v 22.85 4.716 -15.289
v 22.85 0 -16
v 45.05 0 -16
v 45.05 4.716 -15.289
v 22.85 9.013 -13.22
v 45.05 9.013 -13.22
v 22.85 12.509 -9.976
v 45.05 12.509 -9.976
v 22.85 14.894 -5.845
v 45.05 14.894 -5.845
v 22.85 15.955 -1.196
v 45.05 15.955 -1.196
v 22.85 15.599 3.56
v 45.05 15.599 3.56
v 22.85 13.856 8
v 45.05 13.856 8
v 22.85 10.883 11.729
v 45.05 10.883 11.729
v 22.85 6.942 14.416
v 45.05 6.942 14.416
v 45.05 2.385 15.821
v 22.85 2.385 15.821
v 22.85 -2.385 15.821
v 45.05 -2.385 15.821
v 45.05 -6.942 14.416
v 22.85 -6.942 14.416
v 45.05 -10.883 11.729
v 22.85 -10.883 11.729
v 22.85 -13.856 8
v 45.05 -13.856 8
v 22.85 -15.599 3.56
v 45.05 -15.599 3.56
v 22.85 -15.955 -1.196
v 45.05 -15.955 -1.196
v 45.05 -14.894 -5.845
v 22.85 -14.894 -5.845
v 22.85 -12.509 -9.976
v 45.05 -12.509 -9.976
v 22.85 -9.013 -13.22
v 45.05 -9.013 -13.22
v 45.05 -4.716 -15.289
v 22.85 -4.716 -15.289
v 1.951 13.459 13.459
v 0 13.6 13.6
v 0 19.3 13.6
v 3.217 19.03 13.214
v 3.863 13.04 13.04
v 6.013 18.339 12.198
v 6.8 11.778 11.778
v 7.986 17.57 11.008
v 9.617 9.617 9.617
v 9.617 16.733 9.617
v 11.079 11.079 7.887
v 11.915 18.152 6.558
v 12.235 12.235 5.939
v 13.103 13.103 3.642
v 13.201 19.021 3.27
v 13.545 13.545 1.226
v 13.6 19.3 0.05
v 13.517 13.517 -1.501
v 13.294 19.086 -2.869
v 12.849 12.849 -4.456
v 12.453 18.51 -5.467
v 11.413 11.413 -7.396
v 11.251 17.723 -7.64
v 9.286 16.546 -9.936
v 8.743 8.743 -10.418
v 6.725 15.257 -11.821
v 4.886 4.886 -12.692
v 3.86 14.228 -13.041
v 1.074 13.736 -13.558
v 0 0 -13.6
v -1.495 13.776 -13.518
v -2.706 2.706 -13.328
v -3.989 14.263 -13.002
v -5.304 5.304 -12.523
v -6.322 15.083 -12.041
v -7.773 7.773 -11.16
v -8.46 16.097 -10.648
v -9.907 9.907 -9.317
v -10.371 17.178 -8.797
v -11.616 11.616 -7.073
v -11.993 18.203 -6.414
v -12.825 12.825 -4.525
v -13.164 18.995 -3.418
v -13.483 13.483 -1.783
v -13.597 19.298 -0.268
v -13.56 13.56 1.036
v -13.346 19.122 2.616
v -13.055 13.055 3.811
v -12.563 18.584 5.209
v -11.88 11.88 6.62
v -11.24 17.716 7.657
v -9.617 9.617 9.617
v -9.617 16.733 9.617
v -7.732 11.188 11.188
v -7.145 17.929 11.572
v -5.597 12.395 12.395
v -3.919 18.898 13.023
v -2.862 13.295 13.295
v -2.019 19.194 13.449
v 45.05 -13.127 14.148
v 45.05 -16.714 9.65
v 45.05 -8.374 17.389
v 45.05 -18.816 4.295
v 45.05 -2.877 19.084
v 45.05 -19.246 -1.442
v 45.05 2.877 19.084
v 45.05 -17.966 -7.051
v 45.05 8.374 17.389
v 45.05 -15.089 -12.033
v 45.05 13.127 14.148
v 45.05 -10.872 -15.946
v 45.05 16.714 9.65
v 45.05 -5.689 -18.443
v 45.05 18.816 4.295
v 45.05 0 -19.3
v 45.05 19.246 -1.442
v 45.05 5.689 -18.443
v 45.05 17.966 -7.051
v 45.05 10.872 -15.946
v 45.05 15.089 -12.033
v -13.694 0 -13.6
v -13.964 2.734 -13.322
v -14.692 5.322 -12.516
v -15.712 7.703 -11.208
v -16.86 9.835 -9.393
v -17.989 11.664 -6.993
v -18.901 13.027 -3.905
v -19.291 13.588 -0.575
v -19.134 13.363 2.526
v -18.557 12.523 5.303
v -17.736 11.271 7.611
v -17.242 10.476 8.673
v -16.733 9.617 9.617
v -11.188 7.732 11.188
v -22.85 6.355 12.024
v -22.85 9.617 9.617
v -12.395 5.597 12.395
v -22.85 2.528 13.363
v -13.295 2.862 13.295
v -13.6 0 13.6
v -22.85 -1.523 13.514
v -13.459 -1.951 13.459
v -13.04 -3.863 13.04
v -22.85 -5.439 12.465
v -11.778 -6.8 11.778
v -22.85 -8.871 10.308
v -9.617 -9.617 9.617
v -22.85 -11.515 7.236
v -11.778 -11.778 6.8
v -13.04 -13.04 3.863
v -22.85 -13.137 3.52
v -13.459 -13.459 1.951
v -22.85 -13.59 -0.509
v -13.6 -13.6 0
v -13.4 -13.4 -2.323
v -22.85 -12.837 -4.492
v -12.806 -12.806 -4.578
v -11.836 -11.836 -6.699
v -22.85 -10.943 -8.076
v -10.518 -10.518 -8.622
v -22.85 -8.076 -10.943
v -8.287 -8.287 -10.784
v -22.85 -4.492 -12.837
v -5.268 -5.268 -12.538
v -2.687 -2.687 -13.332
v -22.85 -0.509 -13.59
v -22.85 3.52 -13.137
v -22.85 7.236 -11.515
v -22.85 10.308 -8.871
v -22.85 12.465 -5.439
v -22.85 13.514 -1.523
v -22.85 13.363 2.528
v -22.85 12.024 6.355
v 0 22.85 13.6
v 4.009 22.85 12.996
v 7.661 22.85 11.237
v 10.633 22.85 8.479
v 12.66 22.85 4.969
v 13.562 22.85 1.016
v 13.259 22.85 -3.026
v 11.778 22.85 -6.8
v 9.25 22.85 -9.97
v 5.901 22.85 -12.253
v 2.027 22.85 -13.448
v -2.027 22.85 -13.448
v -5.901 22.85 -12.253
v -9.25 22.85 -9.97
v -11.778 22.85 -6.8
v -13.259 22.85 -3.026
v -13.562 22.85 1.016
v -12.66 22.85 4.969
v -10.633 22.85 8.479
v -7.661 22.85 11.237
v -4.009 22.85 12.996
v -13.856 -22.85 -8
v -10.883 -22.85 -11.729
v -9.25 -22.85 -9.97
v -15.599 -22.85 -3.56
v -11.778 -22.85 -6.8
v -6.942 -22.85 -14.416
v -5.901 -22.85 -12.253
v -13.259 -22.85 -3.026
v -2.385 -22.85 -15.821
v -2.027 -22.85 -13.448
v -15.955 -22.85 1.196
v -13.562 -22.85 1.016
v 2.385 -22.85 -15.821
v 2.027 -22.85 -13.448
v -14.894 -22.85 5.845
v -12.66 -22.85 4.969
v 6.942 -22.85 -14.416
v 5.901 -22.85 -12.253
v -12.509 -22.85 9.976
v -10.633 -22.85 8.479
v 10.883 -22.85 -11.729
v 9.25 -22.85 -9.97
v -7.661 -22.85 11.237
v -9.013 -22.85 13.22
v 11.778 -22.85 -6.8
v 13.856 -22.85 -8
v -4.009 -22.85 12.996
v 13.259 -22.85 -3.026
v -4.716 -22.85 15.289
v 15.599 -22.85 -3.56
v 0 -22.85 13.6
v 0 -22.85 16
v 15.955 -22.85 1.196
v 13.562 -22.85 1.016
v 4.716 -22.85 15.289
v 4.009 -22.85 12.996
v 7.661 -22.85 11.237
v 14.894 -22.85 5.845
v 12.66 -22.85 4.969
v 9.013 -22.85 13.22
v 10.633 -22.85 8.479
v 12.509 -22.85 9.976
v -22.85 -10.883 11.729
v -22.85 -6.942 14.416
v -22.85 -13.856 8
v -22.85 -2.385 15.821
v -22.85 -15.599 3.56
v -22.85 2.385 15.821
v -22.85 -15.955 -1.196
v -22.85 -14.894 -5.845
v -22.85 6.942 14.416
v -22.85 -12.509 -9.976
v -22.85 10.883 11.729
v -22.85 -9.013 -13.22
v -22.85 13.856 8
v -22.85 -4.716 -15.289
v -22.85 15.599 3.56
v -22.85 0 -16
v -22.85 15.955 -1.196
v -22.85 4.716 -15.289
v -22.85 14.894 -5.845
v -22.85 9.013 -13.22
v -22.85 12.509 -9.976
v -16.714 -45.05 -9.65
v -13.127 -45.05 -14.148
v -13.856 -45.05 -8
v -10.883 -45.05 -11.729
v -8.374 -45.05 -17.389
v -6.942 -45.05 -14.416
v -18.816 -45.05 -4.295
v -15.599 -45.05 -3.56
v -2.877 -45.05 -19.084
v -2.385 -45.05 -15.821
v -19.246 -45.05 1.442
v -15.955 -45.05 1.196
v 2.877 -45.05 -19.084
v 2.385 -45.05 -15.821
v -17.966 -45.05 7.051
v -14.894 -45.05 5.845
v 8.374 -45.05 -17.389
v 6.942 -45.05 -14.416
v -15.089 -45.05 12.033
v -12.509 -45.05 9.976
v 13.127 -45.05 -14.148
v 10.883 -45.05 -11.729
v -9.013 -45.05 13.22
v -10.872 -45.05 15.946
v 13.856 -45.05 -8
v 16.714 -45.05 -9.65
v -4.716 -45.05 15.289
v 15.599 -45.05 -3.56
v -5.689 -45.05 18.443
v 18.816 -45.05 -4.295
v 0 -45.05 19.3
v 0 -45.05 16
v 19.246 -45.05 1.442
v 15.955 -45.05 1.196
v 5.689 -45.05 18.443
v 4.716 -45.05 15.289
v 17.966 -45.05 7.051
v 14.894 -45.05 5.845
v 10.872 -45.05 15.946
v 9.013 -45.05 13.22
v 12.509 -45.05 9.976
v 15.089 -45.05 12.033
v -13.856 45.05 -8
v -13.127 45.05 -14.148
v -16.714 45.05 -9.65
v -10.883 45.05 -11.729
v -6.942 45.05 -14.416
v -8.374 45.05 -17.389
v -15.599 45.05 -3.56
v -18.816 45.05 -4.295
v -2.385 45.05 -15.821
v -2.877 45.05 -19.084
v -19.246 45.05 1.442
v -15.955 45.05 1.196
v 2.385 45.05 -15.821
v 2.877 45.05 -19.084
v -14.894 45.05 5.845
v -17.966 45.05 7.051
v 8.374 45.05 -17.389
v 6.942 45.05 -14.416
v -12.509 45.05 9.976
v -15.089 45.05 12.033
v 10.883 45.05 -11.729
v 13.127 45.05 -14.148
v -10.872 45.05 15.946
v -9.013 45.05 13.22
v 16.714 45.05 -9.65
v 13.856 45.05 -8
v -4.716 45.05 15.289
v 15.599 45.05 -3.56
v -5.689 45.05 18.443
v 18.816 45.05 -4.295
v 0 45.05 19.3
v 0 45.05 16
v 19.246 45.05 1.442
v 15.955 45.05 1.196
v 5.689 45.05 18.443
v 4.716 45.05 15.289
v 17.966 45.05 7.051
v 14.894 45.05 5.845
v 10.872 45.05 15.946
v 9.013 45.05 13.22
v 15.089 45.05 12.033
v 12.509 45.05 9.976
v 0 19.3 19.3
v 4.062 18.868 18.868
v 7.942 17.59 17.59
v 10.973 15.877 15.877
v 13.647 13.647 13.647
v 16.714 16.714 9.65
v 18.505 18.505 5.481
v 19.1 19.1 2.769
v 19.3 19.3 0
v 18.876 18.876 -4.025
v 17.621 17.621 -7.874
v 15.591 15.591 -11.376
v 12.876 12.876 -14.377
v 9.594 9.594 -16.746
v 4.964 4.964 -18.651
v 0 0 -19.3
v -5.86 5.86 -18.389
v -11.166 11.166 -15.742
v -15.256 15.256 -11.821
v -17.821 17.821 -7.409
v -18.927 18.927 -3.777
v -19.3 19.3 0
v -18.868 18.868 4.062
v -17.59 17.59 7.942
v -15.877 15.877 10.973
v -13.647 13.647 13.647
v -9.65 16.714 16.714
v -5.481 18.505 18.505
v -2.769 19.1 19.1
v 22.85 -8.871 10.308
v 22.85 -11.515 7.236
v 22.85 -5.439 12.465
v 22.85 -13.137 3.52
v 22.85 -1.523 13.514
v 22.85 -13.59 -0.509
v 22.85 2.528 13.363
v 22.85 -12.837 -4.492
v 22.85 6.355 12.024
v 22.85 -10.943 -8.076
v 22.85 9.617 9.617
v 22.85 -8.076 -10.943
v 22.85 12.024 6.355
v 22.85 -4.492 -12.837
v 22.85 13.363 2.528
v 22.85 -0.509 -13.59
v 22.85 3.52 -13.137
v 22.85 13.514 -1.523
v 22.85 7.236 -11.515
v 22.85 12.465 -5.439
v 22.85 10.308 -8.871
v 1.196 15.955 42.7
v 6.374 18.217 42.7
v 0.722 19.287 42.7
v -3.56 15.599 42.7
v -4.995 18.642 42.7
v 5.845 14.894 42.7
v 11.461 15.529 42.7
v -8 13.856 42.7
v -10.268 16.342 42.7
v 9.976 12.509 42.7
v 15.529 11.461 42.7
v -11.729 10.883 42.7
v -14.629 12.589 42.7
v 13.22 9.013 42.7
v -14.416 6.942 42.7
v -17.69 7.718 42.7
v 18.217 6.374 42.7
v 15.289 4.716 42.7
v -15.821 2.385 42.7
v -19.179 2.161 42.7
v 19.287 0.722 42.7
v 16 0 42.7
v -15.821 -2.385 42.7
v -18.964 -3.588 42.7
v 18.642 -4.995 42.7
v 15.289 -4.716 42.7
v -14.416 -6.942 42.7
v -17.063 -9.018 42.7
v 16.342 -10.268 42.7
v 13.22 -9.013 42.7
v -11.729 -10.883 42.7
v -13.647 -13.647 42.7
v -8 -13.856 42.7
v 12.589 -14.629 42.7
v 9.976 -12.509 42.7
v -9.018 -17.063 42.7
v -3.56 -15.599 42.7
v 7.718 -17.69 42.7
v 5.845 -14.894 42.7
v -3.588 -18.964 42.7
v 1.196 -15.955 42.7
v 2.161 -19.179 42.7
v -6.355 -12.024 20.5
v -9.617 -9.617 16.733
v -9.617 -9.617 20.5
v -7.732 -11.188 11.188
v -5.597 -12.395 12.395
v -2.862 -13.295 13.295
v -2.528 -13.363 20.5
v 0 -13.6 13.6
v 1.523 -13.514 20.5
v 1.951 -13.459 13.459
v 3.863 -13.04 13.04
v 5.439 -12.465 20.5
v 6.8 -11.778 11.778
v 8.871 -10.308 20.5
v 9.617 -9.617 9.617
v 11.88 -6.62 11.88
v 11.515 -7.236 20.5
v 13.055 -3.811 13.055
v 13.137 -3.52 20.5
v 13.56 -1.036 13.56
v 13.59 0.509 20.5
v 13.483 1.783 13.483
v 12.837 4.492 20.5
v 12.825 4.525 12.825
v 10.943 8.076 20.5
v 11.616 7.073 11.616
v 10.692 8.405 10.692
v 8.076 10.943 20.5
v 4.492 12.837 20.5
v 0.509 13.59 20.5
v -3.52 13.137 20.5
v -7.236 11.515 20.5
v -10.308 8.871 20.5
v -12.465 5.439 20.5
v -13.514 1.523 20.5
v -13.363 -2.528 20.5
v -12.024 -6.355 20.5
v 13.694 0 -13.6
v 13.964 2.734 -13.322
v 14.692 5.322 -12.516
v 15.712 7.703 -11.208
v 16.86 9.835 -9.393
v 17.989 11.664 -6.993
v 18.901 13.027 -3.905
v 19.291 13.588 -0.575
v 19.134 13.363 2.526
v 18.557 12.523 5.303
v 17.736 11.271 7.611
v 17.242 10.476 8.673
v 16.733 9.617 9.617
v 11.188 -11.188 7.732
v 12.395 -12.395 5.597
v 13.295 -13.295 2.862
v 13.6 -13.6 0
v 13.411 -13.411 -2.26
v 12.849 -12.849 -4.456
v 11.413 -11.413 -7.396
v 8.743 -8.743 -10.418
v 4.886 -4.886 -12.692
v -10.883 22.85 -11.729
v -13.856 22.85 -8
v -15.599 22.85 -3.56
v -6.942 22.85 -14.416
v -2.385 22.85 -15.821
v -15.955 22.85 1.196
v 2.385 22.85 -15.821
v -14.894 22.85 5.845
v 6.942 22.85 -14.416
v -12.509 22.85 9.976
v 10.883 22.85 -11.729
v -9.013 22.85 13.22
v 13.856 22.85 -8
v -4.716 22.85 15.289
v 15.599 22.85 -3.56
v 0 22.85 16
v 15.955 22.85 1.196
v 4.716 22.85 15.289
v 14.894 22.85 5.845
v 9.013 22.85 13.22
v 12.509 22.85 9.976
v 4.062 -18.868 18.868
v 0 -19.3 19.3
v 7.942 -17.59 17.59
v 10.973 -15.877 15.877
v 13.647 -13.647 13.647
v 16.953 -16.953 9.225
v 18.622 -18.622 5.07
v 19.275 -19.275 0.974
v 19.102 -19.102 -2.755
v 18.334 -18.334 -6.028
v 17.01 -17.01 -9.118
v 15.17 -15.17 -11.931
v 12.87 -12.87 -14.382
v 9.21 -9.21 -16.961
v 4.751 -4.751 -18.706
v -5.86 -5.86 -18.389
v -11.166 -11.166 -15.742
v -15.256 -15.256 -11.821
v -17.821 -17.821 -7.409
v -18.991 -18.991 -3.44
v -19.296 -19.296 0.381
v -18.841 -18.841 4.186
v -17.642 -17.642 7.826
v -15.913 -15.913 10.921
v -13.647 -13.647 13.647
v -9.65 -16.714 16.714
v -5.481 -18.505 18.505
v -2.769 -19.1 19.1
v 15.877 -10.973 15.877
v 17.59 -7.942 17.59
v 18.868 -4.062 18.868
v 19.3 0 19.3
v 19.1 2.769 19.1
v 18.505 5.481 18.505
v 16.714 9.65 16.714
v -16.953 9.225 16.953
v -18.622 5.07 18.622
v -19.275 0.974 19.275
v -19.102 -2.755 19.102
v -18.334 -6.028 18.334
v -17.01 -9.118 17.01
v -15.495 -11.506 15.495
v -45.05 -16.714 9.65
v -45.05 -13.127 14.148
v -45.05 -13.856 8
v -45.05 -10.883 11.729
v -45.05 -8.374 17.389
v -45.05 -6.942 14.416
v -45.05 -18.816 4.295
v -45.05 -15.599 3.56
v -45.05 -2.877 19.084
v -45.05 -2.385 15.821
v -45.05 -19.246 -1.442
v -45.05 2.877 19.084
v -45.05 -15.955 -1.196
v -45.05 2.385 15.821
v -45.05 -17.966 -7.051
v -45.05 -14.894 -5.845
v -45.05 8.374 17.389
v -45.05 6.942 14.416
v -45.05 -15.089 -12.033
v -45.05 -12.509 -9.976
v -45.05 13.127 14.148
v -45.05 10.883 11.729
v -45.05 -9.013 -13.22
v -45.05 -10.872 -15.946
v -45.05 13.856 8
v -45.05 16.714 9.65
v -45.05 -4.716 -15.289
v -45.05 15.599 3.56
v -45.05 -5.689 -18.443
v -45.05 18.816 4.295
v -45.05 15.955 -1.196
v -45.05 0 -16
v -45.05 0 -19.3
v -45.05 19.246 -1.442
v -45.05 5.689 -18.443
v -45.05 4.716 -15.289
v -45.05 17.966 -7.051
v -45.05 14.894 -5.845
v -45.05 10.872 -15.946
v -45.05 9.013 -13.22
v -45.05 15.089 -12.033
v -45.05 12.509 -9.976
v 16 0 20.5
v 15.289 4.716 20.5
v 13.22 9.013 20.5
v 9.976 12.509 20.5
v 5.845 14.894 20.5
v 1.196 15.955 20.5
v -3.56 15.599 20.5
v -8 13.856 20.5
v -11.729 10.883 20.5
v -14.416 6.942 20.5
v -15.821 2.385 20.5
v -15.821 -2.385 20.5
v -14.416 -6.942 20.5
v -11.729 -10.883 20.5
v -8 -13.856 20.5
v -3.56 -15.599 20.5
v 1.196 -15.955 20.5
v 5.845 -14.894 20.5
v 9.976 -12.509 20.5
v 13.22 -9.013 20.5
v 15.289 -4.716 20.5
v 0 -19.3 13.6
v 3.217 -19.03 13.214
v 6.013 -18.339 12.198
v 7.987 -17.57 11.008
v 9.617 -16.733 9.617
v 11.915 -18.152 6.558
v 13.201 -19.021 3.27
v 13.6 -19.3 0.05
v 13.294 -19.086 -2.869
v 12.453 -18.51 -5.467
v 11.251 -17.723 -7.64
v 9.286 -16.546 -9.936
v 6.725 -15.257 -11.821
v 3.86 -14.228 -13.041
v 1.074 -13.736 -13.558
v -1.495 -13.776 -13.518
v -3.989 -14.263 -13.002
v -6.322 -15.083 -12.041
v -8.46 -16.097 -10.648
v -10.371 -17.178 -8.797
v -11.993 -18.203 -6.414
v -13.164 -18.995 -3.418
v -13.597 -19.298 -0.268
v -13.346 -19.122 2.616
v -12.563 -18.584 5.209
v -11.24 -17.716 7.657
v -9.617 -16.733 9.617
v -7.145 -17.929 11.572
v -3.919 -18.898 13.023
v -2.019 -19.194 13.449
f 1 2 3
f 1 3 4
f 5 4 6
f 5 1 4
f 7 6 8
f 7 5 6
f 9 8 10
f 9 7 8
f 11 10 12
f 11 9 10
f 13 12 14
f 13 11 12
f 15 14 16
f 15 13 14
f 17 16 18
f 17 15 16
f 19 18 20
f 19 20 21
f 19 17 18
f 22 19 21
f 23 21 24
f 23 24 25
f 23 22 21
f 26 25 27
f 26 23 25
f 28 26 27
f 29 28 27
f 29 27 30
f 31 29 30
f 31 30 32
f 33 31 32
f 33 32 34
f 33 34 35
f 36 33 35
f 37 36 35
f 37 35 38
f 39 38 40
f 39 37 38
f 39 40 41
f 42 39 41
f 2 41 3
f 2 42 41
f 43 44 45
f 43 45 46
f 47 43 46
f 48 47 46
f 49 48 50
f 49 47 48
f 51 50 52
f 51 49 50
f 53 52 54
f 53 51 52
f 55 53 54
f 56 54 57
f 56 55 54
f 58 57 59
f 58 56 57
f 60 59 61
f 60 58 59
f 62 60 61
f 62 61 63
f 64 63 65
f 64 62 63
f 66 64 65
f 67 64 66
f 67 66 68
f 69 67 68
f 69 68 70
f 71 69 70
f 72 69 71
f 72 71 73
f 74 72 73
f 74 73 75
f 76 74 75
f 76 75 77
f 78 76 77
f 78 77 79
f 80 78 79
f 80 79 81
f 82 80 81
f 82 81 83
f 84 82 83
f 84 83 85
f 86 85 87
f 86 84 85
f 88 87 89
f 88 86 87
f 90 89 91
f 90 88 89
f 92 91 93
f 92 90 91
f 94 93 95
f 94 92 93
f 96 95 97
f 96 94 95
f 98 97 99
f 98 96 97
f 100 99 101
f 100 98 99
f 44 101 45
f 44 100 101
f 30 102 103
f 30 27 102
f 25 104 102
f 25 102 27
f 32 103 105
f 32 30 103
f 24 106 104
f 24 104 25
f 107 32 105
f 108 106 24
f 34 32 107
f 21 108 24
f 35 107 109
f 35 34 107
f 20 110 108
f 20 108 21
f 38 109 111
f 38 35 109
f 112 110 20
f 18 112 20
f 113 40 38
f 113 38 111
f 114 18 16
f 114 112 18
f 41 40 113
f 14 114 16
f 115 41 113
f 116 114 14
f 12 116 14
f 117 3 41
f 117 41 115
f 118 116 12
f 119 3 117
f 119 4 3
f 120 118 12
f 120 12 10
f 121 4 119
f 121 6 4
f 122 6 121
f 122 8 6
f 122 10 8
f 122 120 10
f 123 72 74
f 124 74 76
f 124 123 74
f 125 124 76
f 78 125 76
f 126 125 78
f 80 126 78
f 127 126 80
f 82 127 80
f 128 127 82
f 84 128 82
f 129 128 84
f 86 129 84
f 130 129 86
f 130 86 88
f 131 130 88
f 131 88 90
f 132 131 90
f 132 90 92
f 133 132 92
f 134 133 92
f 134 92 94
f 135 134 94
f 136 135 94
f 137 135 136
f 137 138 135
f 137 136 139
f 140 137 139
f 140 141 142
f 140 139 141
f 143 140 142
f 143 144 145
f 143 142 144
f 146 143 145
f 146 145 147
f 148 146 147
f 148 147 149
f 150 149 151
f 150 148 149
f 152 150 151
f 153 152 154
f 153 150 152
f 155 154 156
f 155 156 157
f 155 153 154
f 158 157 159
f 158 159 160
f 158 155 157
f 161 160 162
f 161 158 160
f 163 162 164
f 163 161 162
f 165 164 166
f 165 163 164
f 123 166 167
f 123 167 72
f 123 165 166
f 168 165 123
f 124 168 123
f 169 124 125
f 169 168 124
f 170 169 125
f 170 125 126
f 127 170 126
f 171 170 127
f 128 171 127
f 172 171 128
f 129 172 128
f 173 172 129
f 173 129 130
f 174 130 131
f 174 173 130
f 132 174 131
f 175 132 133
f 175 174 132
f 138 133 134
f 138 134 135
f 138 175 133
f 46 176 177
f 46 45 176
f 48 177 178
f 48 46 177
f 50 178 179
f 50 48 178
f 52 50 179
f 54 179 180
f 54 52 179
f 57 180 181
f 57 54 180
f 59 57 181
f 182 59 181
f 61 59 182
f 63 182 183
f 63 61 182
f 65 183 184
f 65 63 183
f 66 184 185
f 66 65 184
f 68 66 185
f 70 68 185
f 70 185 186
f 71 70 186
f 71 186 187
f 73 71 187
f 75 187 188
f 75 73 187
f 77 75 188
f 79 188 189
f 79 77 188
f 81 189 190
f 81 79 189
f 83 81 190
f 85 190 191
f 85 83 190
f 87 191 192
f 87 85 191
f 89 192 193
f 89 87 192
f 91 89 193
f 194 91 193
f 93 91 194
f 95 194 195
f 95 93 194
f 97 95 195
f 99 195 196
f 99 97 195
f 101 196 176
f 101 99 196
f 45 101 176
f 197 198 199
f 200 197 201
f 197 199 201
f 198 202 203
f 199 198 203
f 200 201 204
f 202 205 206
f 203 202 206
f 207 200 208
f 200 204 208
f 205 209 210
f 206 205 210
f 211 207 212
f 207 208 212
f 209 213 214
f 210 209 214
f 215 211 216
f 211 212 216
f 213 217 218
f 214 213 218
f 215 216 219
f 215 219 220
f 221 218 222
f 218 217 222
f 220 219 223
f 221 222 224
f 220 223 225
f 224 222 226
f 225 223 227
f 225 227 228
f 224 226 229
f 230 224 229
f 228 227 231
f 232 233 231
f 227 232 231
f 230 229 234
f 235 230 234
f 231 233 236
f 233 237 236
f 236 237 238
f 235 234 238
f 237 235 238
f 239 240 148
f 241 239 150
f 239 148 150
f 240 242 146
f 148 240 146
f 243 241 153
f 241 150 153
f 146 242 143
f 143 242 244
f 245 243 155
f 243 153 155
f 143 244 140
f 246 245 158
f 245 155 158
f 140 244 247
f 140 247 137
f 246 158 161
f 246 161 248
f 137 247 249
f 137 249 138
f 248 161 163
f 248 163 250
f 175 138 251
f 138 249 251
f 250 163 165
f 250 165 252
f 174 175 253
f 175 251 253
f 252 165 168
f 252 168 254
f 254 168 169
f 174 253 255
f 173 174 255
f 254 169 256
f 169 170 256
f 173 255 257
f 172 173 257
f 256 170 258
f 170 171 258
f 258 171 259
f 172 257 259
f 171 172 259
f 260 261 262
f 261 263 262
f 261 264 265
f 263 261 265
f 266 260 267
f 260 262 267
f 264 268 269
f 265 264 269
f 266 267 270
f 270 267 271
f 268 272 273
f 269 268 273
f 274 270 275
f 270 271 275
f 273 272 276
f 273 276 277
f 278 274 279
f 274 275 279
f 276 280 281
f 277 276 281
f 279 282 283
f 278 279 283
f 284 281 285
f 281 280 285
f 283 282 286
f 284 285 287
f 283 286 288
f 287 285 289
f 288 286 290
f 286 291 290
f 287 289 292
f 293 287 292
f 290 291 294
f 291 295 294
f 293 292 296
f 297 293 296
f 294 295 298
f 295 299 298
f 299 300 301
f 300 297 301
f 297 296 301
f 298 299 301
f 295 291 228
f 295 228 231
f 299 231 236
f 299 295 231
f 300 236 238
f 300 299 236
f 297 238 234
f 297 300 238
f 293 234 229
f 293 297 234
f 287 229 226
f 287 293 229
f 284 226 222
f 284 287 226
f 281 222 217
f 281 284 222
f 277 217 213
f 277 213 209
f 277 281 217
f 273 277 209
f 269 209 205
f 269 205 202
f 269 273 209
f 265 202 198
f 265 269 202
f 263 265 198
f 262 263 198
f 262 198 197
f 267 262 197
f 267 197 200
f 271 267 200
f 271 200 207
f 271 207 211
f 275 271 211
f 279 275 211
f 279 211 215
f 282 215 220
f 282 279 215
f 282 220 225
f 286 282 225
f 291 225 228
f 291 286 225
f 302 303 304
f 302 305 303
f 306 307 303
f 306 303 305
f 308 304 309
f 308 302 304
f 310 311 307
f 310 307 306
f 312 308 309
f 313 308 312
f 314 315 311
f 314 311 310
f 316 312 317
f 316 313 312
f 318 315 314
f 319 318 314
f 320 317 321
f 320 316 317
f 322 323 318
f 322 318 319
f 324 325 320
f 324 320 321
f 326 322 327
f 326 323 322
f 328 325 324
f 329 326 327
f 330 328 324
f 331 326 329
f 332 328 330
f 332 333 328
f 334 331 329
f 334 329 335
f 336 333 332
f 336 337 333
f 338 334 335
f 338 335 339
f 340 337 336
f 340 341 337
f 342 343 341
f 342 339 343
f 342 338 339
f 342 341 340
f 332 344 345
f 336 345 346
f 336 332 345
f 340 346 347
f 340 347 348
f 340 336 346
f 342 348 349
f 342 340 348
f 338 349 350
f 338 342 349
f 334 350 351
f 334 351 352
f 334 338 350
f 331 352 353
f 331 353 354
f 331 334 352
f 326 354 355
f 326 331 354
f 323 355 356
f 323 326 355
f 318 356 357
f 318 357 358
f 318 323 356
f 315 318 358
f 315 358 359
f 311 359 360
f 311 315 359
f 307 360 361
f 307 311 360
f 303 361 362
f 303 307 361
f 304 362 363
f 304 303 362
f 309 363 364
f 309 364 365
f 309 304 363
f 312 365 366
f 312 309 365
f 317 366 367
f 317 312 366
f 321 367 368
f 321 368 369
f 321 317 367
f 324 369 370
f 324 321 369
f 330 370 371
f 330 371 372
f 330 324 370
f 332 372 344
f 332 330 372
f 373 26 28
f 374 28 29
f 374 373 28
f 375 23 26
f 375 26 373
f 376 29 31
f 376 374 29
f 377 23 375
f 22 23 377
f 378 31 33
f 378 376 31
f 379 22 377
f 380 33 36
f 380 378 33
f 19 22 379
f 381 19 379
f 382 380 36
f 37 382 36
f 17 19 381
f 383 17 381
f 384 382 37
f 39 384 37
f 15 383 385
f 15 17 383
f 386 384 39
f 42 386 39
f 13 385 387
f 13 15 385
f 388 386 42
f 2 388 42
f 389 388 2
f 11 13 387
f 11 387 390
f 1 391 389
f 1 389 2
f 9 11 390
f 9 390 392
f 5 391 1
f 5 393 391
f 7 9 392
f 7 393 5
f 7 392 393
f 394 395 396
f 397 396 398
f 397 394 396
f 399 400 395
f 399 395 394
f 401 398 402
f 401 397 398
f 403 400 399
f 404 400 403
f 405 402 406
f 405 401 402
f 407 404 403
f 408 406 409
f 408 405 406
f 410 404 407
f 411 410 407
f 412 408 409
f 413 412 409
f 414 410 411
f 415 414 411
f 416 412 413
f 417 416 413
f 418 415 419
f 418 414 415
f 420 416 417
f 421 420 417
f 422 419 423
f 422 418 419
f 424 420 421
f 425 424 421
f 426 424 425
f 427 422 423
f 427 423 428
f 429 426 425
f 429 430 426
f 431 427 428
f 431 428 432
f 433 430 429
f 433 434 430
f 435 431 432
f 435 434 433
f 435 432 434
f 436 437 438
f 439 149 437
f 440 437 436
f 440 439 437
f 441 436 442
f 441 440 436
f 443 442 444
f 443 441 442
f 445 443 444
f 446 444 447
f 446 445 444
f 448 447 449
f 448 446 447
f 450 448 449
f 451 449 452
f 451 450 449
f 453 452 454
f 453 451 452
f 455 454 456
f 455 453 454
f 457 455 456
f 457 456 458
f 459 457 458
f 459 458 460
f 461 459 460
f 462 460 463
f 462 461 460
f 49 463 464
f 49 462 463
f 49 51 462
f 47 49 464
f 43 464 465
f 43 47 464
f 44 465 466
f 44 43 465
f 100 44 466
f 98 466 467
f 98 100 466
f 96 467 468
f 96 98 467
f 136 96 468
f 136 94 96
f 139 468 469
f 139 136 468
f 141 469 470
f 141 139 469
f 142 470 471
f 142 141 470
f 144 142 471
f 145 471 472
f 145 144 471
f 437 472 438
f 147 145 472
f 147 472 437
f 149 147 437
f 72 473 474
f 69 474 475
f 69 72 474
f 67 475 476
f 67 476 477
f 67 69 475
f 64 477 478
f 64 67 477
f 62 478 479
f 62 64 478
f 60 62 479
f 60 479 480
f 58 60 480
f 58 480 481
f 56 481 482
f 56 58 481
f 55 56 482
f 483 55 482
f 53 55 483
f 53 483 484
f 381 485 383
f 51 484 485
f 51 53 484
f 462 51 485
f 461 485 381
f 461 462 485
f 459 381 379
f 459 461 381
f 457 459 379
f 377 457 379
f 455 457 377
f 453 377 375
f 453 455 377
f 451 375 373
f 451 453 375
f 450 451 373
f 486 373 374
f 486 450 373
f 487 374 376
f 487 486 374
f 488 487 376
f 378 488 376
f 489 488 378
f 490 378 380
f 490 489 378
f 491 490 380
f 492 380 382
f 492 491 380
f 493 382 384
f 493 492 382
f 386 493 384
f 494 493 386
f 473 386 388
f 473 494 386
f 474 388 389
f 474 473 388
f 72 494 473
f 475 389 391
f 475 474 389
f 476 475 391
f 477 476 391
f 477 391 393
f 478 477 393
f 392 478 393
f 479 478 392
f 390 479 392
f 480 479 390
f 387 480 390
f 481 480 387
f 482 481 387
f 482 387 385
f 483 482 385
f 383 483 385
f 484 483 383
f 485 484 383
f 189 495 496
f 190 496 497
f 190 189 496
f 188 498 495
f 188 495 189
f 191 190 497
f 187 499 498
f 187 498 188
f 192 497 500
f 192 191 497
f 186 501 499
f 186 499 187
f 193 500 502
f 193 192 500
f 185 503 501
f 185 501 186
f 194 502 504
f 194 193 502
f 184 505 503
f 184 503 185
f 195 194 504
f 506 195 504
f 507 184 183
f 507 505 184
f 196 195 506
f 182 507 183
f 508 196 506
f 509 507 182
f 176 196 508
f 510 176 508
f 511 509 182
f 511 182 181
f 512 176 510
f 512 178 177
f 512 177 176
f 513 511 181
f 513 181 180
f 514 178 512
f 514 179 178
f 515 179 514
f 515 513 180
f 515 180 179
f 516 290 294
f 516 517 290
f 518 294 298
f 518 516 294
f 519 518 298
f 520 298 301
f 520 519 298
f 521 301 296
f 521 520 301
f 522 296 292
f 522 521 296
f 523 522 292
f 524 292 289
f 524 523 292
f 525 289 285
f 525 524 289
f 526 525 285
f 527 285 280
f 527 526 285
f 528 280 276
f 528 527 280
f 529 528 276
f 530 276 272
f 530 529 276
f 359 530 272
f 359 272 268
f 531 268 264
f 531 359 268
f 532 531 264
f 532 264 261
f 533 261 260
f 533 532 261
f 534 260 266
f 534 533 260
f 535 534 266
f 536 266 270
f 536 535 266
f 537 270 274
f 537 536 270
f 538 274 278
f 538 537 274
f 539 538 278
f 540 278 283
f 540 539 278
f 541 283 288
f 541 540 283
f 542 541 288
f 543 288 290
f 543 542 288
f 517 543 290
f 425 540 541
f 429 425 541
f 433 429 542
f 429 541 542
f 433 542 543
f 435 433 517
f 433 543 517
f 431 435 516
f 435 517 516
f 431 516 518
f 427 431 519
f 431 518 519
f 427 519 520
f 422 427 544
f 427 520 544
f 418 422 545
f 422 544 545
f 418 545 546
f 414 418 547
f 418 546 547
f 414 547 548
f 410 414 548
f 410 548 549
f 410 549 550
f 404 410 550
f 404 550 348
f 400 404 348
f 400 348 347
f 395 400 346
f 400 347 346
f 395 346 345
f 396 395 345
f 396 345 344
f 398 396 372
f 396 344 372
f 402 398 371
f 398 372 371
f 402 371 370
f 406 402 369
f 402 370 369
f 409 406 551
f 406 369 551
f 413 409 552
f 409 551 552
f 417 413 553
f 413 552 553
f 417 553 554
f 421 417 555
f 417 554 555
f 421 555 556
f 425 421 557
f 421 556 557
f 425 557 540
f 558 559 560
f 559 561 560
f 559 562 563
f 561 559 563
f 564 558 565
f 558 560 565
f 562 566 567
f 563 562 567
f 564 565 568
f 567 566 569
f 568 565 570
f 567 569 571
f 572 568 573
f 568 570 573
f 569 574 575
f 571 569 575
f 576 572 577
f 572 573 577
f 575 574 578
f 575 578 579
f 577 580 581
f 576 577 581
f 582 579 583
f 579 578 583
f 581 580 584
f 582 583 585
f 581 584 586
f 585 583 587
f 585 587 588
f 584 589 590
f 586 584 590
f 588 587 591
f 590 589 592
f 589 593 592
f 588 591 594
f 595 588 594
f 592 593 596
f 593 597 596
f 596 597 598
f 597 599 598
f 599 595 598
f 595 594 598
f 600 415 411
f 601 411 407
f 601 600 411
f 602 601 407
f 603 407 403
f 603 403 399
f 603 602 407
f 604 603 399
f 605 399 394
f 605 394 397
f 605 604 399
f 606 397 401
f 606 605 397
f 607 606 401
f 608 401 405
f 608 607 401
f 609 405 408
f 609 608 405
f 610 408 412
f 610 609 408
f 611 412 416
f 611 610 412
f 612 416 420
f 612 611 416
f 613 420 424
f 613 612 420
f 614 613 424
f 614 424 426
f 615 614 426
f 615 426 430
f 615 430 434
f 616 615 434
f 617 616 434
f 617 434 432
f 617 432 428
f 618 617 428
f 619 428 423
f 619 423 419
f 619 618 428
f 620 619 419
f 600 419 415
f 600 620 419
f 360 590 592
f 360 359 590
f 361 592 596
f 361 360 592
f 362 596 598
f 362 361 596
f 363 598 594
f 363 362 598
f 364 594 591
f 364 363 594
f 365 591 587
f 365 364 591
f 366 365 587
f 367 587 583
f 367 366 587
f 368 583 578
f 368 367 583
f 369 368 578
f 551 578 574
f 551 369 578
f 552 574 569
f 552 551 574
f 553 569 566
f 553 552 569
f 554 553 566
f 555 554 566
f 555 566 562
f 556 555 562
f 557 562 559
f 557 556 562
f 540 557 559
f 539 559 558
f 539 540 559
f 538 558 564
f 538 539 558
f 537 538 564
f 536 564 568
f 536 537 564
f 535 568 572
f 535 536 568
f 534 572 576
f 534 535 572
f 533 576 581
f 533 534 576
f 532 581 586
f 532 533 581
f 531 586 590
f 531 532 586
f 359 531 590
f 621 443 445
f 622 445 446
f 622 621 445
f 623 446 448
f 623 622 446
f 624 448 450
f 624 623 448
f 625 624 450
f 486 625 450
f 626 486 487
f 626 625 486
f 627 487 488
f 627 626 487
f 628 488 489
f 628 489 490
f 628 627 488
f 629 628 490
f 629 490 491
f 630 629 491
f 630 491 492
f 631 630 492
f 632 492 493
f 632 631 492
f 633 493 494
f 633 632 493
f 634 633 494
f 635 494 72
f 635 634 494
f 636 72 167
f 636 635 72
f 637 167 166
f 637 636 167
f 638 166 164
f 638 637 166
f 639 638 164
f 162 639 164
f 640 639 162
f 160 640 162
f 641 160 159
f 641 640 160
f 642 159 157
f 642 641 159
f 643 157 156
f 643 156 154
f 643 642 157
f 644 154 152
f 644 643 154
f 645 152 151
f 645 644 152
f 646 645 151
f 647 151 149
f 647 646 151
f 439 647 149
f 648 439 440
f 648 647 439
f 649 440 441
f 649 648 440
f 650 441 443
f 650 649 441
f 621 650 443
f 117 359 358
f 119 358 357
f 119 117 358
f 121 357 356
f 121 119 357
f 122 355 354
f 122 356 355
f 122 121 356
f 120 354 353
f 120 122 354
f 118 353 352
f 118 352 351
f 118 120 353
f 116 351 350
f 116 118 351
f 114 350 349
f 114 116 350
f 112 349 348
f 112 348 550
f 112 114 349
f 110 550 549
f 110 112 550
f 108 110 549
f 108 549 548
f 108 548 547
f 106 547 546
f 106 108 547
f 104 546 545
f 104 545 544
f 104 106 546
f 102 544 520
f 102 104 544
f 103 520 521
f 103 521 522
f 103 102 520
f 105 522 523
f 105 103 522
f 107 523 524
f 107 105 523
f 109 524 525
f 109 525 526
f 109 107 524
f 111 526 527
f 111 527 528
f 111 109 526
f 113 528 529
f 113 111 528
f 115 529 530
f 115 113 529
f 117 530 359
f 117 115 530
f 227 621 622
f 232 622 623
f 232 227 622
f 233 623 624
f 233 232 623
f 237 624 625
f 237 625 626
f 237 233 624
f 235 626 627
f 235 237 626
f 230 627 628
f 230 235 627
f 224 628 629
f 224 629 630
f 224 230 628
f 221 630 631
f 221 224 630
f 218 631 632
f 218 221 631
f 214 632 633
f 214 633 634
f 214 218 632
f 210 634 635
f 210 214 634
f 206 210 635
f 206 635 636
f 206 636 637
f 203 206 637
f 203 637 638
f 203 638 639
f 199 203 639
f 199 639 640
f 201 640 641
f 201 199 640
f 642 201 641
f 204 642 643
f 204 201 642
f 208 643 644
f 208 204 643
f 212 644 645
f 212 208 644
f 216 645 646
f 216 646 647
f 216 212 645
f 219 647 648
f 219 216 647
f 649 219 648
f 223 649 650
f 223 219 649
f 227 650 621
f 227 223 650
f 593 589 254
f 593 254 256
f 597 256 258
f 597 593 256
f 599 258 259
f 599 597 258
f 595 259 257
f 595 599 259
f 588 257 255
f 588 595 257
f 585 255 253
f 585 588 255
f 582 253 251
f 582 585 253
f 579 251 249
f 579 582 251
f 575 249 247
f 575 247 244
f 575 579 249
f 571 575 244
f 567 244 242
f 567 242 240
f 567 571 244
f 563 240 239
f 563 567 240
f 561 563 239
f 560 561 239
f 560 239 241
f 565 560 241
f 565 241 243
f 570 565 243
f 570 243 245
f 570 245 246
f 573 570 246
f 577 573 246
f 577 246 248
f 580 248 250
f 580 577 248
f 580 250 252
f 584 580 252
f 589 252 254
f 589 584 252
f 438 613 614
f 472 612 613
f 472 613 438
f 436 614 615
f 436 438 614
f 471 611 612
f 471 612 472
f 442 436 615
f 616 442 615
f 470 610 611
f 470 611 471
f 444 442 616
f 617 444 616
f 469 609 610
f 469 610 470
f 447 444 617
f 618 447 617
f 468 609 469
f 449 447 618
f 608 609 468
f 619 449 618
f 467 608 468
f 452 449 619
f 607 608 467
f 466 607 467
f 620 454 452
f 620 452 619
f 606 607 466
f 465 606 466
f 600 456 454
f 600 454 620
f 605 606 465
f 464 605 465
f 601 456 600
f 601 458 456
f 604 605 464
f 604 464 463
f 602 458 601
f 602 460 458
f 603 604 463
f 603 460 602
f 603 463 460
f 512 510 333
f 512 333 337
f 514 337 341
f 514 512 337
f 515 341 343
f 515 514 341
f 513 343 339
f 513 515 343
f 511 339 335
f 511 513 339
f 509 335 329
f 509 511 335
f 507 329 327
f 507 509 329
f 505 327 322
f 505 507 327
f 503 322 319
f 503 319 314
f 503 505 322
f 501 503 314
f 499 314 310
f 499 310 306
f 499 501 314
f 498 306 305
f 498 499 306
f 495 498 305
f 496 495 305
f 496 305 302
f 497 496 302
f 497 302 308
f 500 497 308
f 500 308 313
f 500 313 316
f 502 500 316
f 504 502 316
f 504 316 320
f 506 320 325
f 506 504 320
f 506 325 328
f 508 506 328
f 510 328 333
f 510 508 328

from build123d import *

# Parameters (mm, degrees)
SKETCH_1_R               = 19.3
SKETCH_1_R_2             = 13.6
EXTRUDE_1_DEPTH          = 45.05
SKETCH_3_R               = 19.3
SKETCH_3_R_2             = 13.6
EXTRUDE_3_DEPTH          = 45.05
SKETCH_2_R               = 19.3
SKETCH_2_R_2             = 13.6
EXTRUDE_2_DEPTH          = 42.7
CUT_EXTRUDE_1_DEPTH      = 77.696121327
CUT_EXTRUDE_1_DEPTH_BACK = 77.696121327
SKETCH_1_13_R            = 13.6
CUT_EXTRUDE_START        = -19.3000001
CUT_EXTRUDE_2_OUTLINE_R  = 13.6
CUT_EXTRUDE_2_DEPTH      = 38.6000002
CUT_EXTRUDE_START_2      = 9.616652
SKETCH_2_8_R             = 13.6
CUT_EXTRUDE_3_DEPTH      = 9.683348
CUT_EXTRUDE_START_3      = -45.05
SKETCH_1_15_R            = 16
CUT_EXTRUDE_4_DEPTH      = 22.2
CUT_EXTRUDE_START_4      = 22.85
SKETCH_1_16_R            = 16
CUT_EXTRUDE_5_DEPTH      = 22.2
SKETCH_3_9_R             = 16
CUT_EXTRUDE_6_DEPTH      = 22.2
SKETCH_3_10_R            = 16
CUT_EXTRUDE_7_DEPTH      = 22.2
CUT_EXTRUDE_START_5      = 20.5
SKETCH_2_9_R             = 16
SKETCH_2_9_R_2           = 13.6
CUT_EXTRUDE_8_DEPTH      = 22.2


# Read off the part's stored shape, not the designer's step: 切除-拉伸2
with BuildPart() as part:
    # 草图1 → 凸台-拉伸1 (new, symmetric)
    with BuildSketch(Plane(origin=(0, 0, 0), x_dir=(1, 0, 0), z_dir=(0, 1, 0))):
        with Locations(Location((0, 0, 0), (0, 0, 270))):
            Circle(SKETCH_1_R)
        with Locations(Location((0, 0, 0), (0, 0, 270))):
            Circle(SKETCH_1_R_2, mode=Mode.SUBTRACT)
    extrude(amount=EXTRUDE_1_DEPTH, both=True)

    # 草图3 → 凸台-拉伸3 (add, symmetric)
    with BuildSketch(Plane(origin=(0, 0, 0), x_dir=(0, 0, -1), z_dir=(1, 0, 0))):
        Circle(SKETCH_3_R)
        with Locations(Location((0, 0, 0), (0, 0, 135.000000053))):
            Circle(SKETCH_3_R_2, mode=Mode.SUBTRACT)
    extrude(amount=EXTRUDE_3_DEPTH, both=True)

    # 草图2 → 凸台-拉伸2 (add)
    with BuildSketch(Plane.XY):
        with Locations(Location((0, 0, 0), (0, 0, 225))):
            Circle(SKETCH_2_R)
        with Locations(Location((0, 0, 0), (0, 0, 224.999996881))):
            Circle(SKETCH_2_R_2, mode=Mode.SUBTRACT)
    extrude(amount=EXTRUDE_2_DEPTH)

    # 草图1<13> → 切除-拉伸1 (cut, two sides: drawn at the far end of the back side and taken through both)
    with BuildSketch(Plane(origin=(0, 0, 0), x_dir=(1, 0, 0), z_dir=(0, 1, 0)).offset(-CUT_EXTRUDE_1_DEPTH_BACK)):
        with Locations(Location((0, 0, 0), (0, 0, 270))):
            Circle(SKETCH_1_13_R)
    extrude(amount=CUT_EXTRUDE_1_DEPTH + CUT_EXTRUDE_1_DEPTH_BACK, mode=Mode.SUBTRACT)

    # 切除-拉伸2 outline → 切除-拉伸2 (cut)
    with BuildSketch(Plane(origin=(0, 0, 0), x_dir=(0, 0, -1), z_dir=(1, 0, 0)).offset(CUT_EXTRUDE_START)):
        Circle(CUT_EXTRUDE_2_OUTLINE_R)
    extrude(amount=CUT_EXTRUDE_2_DEPTH, mode=Mode.SUBTRACT)

    # 草图2<8> → 切除-拉伸3 (cut)
    with BuildSketch(Plane.XY.offset(CUT_EXTRUDE_START_2)):
        with Locations(Location((0, 0, 0), (0, 0, 225))):
            Circle(SKETCH_2_8_R)
    extrude(amount=CUT_EXTRUDE_3_DEPTH, mode=Mode.SUBTRACT)

    # 草图1<15> → 切除-拉伸4 (cut)
    with BuildSketch(Plane(origin=(0, 0, 0), x_dir=(1, 0, 0), z_dir=(0, 1, 0)).offset(CUT_EXTRUDE_START_3)):
        with Locations(Location((0, 0, 0), (0, 0, 270))):
            Circle(SKETCH_1_15_R)
    extrude(amount=CUT_EXTRUDE_4_DEPTH, mode=Mode.SUBTRACT)

    # 草图1<16> → 切除-拉伸5 (cut)
    with BuildSketch(Plane(origin=(0, 0, 0), x_dir=(1, 0, 0), z_dir=(0, 1, 0)).offset(CUT_EXTRUDE_START_4)):
        with Locations(Location((0, 0, 0), (0, 0, 270))):
            Circle(SKETCH_1_16_R)
    extrude(amount=CUT_EXTRUDE_5_DEPTH, mode=Mode.SUBTRACT)

    # 草图3<9> → 切除-拉伸6 (cut)
    with BuildSketch(Plane(origin=(0, 0, 0), x_dir=(0, 0, -1), z_dir=(1, 0, 0)).offset(CUT_EXTRUDE_START_3)):
        Circle(SKETCH_3_9_R)
    extrude(amount=CUT_EXTRUDE_6_DEPTH, mode=Mode.SUBTRACT)

    # 草图3<10> → 切除-拉伸7 (cut)
    with BuildSketch(Plane(origin=(0, 0, 0), x_dir=(0, 0, -1), z_dir=(1, 0, 0)).offset(CUT_EXTRUDE_START_4)):
        Circle(SKETCH_3_10_R)
    extrude(amount=CUT_EXTRUDE_7_DEPTH, mode=Mode.SUBTRACT)

    # 草图2<9> → 切除-拉伸8 (cut)
    with BuildSketch(Plane.XY.offset(CUT_EXTRUDE_START_5)):
        Circle(SKETCH_2_9_R)
        with Locations(Location((0, 0, 0), (0, 0, 225))):
            Circle(SKETCH_2_9_R_2, mode=Mode.SUBTRACT)
    extrude(amount=CUT_EXTRUDE_8_DEPTH, mode=Mode.SUBTRACT)


solid = part.part
